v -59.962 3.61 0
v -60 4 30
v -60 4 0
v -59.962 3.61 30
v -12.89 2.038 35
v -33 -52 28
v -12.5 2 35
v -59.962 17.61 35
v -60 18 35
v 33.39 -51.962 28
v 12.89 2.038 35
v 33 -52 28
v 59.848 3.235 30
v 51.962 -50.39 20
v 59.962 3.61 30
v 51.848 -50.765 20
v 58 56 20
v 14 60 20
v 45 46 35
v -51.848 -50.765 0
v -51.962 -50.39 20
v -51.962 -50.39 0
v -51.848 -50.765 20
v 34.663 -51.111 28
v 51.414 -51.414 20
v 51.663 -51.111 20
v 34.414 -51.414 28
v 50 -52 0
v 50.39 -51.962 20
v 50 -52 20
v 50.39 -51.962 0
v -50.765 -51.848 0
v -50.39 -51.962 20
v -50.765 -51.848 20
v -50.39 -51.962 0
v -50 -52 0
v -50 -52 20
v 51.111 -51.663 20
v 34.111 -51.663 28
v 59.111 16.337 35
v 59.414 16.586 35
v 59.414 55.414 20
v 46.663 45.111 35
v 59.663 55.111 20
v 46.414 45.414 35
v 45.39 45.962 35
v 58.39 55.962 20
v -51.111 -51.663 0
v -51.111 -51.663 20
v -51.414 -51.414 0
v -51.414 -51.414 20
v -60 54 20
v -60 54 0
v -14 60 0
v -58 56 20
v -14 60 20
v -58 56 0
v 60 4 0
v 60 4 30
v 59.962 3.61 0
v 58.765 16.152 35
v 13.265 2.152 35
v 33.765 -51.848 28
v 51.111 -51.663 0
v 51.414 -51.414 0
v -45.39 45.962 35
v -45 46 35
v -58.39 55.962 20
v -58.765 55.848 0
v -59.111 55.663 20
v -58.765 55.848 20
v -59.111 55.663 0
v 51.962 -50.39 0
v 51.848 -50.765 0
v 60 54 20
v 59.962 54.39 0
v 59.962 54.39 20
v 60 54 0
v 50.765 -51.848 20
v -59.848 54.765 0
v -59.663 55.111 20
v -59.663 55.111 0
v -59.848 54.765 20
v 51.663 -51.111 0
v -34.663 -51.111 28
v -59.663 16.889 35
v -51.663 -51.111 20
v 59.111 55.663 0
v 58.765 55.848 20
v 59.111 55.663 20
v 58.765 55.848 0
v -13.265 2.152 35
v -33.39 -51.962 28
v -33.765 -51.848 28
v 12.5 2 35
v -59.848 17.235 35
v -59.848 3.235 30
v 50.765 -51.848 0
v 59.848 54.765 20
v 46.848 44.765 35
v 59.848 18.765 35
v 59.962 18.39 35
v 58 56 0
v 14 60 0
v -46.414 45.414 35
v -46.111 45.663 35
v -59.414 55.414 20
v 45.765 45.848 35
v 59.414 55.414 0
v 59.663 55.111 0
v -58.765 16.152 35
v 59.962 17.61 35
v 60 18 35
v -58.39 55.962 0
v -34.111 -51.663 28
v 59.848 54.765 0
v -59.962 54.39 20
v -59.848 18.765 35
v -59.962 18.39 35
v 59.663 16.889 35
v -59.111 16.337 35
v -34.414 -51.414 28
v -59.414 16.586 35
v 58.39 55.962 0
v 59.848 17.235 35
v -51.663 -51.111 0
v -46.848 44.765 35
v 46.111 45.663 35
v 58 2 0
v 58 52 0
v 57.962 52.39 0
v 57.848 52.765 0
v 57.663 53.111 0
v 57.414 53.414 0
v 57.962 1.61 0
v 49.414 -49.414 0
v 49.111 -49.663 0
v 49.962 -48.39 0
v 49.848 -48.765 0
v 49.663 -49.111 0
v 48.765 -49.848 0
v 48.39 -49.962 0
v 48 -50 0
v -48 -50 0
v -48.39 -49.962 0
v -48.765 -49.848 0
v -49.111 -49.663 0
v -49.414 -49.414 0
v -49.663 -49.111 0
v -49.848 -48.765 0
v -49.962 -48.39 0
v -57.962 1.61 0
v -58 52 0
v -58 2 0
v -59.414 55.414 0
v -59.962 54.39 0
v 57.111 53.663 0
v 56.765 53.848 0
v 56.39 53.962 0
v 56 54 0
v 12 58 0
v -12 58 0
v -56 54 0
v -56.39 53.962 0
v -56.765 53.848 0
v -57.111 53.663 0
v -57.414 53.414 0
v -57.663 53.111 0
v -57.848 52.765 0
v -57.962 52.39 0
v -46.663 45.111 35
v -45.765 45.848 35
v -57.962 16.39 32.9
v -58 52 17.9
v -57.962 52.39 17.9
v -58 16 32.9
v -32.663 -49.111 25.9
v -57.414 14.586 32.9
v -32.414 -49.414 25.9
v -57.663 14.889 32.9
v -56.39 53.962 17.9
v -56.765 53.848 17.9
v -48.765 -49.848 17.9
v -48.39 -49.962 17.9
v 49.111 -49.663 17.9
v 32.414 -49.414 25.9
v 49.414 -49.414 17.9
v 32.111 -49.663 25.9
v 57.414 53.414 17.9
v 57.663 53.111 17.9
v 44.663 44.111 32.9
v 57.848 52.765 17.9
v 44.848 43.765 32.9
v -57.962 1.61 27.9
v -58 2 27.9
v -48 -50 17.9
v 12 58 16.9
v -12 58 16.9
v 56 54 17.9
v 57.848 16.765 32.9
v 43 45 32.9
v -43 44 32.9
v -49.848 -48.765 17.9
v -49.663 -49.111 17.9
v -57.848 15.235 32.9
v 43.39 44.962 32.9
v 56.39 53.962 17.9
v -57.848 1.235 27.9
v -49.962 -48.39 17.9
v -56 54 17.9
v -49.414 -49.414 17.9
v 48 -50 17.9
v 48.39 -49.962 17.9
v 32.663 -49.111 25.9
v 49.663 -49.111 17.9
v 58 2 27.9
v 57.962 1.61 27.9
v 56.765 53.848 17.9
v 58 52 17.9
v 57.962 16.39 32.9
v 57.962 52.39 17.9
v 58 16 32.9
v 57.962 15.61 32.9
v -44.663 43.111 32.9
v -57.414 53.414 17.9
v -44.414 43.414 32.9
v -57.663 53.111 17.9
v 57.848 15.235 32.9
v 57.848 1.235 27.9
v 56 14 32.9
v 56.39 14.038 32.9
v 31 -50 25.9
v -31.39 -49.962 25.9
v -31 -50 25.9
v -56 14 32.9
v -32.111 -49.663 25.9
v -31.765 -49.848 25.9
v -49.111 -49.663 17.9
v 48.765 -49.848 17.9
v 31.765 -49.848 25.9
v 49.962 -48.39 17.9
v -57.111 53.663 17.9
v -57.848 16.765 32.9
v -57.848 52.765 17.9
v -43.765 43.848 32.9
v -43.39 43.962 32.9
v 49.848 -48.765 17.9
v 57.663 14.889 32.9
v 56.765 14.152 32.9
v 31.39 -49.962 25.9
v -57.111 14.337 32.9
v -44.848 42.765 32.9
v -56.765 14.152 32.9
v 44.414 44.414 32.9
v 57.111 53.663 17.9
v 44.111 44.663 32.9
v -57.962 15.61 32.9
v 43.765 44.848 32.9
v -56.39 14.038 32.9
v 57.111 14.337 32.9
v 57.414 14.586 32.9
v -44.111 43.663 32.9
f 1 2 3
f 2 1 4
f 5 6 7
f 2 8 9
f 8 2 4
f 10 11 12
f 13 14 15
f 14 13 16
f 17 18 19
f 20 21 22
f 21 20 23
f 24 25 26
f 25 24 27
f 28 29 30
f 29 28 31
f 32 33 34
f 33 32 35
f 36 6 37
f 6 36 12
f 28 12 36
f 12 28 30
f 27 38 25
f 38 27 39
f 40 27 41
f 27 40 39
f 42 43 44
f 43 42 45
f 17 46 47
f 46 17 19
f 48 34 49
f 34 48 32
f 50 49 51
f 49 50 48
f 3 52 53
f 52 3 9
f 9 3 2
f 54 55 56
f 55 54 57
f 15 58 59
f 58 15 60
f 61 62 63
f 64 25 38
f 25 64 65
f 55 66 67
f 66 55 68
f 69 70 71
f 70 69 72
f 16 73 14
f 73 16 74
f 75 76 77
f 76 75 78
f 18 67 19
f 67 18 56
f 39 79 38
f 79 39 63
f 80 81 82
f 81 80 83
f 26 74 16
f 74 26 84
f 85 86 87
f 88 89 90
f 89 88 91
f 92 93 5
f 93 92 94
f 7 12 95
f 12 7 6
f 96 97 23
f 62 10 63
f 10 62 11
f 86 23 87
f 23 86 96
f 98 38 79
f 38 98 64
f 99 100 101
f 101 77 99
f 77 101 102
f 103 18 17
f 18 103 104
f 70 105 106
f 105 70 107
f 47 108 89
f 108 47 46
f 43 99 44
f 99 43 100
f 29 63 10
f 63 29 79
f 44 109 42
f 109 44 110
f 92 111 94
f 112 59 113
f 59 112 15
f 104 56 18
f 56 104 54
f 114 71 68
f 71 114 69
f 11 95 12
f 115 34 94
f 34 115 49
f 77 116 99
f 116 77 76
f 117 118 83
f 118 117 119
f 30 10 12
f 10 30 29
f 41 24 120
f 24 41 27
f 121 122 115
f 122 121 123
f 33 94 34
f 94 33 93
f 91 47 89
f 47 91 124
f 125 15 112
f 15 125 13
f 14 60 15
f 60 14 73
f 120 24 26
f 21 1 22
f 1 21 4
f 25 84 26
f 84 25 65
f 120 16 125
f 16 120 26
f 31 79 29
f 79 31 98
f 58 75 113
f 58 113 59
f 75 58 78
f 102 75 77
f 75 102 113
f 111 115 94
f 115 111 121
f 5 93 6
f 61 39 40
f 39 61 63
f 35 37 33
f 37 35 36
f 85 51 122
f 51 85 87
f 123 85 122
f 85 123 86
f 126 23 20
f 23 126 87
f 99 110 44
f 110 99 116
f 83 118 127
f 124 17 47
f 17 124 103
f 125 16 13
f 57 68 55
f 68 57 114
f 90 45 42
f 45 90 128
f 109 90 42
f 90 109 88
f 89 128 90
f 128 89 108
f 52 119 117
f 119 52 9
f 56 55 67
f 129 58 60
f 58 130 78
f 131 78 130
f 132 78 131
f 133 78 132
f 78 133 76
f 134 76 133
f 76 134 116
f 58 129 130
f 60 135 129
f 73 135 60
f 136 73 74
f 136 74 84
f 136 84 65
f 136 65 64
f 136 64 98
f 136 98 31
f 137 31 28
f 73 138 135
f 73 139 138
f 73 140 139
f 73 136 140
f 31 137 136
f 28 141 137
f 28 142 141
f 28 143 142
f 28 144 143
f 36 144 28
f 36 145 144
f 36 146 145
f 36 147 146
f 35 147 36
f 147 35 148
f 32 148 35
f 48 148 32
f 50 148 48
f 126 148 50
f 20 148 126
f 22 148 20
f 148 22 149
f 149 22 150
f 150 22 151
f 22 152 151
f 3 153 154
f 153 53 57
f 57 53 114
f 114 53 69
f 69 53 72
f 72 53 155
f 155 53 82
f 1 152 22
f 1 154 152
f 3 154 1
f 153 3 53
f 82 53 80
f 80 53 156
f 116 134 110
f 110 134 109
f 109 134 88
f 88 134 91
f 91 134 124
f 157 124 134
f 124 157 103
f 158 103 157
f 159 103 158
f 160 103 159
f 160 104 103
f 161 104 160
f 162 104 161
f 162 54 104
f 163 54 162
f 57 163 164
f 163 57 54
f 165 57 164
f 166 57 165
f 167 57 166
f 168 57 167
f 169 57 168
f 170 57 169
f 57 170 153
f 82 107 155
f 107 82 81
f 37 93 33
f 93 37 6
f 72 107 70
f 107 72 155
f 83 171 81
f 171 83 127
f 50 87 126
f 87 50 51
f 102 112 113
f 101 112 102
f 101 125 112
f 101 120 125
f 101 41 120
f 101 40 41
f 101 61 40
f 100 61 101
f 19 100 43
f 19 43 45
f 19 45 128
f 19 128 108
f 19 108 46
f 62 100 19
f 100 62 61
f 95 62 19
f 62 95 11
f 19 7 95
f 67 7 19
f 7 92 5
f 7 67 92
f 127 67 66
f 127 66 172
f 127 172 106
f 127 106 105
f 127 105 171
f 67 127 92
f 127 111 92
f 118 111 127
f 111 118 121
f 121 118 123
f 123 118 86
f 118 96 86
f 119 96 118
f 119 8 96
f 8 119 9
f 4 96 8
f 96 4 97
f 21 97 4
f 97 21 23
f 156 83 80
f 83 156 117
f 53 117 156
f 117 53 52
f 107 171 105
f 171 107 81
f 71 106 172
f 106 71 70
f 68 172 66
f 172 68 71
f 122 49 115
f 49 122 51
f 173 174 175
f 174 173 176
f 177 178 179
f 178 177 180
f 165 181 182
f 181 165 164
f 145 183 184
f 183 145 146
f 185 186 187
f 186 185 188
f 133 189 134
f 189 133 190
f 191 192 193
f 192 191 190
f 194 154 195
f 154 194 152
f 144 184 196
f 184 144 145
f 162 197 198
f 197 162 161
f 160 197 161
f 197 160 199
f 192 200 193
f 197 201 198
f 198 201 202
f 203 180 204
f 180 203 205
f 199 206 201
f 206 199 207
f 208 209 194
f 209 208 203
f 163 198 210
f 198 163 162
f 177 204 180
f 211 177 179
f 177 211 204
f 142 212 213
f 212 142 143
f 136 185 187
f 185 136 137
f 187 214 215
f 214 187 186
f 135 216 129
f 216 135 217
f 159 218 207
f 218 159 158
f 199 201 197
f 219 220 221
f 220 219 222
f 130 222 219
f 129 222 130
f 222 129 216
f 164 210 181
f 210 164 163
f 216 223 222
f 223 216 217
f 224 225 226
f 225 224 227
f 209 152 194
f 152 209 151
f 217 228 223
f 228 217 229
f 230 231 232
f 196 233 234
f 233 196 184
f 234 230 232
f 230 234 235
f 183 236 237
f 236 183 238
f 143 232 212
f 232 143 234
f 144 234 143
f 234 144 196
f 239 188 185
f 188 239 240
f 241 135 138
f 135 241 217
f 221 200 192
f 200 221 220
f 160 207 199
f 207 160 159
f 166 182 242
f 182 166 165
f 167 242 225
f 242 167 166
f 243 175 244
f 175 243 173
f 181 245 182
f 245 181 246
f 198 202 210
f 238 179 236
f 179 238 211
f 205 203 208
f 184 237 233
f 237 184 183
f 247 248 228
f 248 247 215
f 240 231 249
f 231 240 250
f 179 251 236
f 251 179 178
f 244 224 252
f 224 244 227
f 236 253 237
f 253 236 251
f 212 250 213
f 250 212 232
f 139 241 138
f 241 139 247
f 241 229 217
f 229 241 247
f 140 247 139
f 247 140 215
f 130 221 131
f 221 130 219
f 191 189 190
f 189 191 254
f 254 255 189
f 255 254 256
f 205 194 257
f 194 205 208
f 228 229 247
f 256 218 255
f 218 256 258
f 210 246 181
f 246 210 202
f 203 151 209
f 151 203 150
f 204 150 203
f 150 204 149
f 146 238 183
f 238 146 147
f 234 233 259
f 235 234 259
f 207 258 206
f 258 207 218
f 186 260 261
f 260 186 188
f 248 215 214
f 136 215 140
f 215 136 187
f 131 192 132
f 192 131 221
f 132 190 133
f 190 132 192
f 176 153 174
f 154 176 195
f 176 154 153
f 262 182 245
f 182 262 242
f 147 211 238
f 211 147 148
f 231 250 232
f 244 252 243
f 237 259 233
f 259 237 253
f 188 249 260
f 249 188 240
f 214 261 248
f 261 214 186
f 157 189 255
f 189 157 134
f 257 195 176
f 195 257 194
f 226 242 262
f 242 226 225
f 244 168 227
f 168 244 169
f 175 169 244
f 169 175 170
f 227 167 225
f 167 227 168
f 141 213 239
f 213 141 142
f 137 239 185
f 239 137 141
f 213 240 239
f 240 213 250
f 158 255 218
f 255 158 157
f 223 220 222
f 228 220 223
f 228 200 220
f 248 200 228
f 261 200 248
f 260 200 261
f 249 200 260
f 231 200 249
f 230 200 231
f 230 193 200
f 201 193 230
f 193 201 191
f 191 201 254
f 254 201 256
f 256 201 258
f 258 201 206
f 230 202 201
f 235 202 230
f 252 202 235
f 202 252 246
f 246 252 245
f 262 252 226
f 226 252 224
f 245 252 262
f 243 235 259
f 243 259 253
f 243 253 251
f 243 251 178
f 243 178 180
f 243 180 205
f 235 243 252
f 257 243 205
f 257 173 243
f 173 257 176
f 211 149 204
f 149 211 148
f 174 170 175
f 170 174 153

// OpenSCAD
rad=2;

chest();

module chest(){
    
    union(){
    
        difference(){
            
            union(){

                hull(){
                    
                    translate([-28/2, 58, 0])
                    cylinder(r=rad, h=20, $fn=32);
                    
                    translate([28/2, 58, 0])
                    cylinder(r=rad, h=20, $fn=32);
                    
                    translate([-116/2, 54, 0])
                    cylinder(r=rad, h=20, $fn=32);
                    
                    translate([116/2, 54, 0])
                    cylinder(r=rad, h=20, $fn=32);
                    
                    translate([-116/2, 4, 0])
                    #cylinder(r=rad, h=30, $fn=32);
                    
                    translate([116/2, 4, 0])
                    #cylinder(r=rad, h=30, $fn=32);

                    translate([-100/2, -50, 0])
                    cylinder(r=rad, h=20, $fn=32);
                    
                    translate([100/2, -50, 0])
                    cylinder(r=rad, h=20, $fn=32);
                    
                    
                    translate([-25/2, 4, 0])
                    #cylinder(r=rad, h=35, $fn=32);
                    
                    translate([25/2, 4, 0])
                    #cylinder(r=rad, h=35, $fn=32);
                    
                    
                    translate([-66/2, -50, 0])
                    #cylinder(r=rad, h=28, $fn=32);
                    
                    translate([66/2, -50, 0])
                    #cylinder(r=rad, h=28, $fn=32);
                    
                    translate([-116/2, 18, 0])
                    #cylinder(r=rad, h=35, $fn=32);
                    
                    translate([116/2, 18, 0])
                    #cylinder(r=rad, h=35, $fn=32);
                    
                    translate([-90/2, 44, 0])
                    #cylinder(r=rad, h=35, $fn=32);
                    
                    translate([90/2, 44, 0])
                    #cylinder(r=rad, h=35, $fn=32);
                    
                    
                }
                
            }
            
            translate([0, 0, -0.1])
            hull(){
                
                translate([-24/2, 56, -1])
                cylinder(r=rad, h=18, $fn=32);
                
                translate([24/2, 56, -1])
                cylinder(r=rad, h=18, $fn=32);
                
                translate([-112/2, 52, 0])
                cylinder(r=rad, h=18, $fn=32);
                
                translate([112/2, 52, 0])
                cylinder(r=rad, h=18, $fn=32);
                
                translate([-112/2, 2, 0])
                cylinder(r=rad, h=28, $fn=32);
                
                translate([112/2, 2, 0])
                cylinder(r=rad, h=28, $fn=32);

                translate([-96/2, -48, 0])
                cylinder(r=rad, h=18, $fn=32);
                
                translate([96/2, -48, 0])
                cylinder(r=rad, h=18, $fn=32);
                
                
                
                translate([-62/2, -48, 0])
                cylinder(r=rad, h=26, $fn=32);
                
                translate([62/2, -48, 0])
                cylinder(r=rad, h=26, $fn=32);
                
                translate([-112/2, 16, 0])
                cylinder(r=rad, h=33, $fn=32);
                
                translate([112/2, 16, 0])
                cylinder(r=rad, h=33, $fn=32);
                
                translate([-86/2, 42, 0])
                cylinder(r=rad, h=33, $fn=32);
                
                translate([86/2, 43, 0])
                cylinder(r=rad, h=33, $fn=32);
                
            }
                
                

        }
    }
}
